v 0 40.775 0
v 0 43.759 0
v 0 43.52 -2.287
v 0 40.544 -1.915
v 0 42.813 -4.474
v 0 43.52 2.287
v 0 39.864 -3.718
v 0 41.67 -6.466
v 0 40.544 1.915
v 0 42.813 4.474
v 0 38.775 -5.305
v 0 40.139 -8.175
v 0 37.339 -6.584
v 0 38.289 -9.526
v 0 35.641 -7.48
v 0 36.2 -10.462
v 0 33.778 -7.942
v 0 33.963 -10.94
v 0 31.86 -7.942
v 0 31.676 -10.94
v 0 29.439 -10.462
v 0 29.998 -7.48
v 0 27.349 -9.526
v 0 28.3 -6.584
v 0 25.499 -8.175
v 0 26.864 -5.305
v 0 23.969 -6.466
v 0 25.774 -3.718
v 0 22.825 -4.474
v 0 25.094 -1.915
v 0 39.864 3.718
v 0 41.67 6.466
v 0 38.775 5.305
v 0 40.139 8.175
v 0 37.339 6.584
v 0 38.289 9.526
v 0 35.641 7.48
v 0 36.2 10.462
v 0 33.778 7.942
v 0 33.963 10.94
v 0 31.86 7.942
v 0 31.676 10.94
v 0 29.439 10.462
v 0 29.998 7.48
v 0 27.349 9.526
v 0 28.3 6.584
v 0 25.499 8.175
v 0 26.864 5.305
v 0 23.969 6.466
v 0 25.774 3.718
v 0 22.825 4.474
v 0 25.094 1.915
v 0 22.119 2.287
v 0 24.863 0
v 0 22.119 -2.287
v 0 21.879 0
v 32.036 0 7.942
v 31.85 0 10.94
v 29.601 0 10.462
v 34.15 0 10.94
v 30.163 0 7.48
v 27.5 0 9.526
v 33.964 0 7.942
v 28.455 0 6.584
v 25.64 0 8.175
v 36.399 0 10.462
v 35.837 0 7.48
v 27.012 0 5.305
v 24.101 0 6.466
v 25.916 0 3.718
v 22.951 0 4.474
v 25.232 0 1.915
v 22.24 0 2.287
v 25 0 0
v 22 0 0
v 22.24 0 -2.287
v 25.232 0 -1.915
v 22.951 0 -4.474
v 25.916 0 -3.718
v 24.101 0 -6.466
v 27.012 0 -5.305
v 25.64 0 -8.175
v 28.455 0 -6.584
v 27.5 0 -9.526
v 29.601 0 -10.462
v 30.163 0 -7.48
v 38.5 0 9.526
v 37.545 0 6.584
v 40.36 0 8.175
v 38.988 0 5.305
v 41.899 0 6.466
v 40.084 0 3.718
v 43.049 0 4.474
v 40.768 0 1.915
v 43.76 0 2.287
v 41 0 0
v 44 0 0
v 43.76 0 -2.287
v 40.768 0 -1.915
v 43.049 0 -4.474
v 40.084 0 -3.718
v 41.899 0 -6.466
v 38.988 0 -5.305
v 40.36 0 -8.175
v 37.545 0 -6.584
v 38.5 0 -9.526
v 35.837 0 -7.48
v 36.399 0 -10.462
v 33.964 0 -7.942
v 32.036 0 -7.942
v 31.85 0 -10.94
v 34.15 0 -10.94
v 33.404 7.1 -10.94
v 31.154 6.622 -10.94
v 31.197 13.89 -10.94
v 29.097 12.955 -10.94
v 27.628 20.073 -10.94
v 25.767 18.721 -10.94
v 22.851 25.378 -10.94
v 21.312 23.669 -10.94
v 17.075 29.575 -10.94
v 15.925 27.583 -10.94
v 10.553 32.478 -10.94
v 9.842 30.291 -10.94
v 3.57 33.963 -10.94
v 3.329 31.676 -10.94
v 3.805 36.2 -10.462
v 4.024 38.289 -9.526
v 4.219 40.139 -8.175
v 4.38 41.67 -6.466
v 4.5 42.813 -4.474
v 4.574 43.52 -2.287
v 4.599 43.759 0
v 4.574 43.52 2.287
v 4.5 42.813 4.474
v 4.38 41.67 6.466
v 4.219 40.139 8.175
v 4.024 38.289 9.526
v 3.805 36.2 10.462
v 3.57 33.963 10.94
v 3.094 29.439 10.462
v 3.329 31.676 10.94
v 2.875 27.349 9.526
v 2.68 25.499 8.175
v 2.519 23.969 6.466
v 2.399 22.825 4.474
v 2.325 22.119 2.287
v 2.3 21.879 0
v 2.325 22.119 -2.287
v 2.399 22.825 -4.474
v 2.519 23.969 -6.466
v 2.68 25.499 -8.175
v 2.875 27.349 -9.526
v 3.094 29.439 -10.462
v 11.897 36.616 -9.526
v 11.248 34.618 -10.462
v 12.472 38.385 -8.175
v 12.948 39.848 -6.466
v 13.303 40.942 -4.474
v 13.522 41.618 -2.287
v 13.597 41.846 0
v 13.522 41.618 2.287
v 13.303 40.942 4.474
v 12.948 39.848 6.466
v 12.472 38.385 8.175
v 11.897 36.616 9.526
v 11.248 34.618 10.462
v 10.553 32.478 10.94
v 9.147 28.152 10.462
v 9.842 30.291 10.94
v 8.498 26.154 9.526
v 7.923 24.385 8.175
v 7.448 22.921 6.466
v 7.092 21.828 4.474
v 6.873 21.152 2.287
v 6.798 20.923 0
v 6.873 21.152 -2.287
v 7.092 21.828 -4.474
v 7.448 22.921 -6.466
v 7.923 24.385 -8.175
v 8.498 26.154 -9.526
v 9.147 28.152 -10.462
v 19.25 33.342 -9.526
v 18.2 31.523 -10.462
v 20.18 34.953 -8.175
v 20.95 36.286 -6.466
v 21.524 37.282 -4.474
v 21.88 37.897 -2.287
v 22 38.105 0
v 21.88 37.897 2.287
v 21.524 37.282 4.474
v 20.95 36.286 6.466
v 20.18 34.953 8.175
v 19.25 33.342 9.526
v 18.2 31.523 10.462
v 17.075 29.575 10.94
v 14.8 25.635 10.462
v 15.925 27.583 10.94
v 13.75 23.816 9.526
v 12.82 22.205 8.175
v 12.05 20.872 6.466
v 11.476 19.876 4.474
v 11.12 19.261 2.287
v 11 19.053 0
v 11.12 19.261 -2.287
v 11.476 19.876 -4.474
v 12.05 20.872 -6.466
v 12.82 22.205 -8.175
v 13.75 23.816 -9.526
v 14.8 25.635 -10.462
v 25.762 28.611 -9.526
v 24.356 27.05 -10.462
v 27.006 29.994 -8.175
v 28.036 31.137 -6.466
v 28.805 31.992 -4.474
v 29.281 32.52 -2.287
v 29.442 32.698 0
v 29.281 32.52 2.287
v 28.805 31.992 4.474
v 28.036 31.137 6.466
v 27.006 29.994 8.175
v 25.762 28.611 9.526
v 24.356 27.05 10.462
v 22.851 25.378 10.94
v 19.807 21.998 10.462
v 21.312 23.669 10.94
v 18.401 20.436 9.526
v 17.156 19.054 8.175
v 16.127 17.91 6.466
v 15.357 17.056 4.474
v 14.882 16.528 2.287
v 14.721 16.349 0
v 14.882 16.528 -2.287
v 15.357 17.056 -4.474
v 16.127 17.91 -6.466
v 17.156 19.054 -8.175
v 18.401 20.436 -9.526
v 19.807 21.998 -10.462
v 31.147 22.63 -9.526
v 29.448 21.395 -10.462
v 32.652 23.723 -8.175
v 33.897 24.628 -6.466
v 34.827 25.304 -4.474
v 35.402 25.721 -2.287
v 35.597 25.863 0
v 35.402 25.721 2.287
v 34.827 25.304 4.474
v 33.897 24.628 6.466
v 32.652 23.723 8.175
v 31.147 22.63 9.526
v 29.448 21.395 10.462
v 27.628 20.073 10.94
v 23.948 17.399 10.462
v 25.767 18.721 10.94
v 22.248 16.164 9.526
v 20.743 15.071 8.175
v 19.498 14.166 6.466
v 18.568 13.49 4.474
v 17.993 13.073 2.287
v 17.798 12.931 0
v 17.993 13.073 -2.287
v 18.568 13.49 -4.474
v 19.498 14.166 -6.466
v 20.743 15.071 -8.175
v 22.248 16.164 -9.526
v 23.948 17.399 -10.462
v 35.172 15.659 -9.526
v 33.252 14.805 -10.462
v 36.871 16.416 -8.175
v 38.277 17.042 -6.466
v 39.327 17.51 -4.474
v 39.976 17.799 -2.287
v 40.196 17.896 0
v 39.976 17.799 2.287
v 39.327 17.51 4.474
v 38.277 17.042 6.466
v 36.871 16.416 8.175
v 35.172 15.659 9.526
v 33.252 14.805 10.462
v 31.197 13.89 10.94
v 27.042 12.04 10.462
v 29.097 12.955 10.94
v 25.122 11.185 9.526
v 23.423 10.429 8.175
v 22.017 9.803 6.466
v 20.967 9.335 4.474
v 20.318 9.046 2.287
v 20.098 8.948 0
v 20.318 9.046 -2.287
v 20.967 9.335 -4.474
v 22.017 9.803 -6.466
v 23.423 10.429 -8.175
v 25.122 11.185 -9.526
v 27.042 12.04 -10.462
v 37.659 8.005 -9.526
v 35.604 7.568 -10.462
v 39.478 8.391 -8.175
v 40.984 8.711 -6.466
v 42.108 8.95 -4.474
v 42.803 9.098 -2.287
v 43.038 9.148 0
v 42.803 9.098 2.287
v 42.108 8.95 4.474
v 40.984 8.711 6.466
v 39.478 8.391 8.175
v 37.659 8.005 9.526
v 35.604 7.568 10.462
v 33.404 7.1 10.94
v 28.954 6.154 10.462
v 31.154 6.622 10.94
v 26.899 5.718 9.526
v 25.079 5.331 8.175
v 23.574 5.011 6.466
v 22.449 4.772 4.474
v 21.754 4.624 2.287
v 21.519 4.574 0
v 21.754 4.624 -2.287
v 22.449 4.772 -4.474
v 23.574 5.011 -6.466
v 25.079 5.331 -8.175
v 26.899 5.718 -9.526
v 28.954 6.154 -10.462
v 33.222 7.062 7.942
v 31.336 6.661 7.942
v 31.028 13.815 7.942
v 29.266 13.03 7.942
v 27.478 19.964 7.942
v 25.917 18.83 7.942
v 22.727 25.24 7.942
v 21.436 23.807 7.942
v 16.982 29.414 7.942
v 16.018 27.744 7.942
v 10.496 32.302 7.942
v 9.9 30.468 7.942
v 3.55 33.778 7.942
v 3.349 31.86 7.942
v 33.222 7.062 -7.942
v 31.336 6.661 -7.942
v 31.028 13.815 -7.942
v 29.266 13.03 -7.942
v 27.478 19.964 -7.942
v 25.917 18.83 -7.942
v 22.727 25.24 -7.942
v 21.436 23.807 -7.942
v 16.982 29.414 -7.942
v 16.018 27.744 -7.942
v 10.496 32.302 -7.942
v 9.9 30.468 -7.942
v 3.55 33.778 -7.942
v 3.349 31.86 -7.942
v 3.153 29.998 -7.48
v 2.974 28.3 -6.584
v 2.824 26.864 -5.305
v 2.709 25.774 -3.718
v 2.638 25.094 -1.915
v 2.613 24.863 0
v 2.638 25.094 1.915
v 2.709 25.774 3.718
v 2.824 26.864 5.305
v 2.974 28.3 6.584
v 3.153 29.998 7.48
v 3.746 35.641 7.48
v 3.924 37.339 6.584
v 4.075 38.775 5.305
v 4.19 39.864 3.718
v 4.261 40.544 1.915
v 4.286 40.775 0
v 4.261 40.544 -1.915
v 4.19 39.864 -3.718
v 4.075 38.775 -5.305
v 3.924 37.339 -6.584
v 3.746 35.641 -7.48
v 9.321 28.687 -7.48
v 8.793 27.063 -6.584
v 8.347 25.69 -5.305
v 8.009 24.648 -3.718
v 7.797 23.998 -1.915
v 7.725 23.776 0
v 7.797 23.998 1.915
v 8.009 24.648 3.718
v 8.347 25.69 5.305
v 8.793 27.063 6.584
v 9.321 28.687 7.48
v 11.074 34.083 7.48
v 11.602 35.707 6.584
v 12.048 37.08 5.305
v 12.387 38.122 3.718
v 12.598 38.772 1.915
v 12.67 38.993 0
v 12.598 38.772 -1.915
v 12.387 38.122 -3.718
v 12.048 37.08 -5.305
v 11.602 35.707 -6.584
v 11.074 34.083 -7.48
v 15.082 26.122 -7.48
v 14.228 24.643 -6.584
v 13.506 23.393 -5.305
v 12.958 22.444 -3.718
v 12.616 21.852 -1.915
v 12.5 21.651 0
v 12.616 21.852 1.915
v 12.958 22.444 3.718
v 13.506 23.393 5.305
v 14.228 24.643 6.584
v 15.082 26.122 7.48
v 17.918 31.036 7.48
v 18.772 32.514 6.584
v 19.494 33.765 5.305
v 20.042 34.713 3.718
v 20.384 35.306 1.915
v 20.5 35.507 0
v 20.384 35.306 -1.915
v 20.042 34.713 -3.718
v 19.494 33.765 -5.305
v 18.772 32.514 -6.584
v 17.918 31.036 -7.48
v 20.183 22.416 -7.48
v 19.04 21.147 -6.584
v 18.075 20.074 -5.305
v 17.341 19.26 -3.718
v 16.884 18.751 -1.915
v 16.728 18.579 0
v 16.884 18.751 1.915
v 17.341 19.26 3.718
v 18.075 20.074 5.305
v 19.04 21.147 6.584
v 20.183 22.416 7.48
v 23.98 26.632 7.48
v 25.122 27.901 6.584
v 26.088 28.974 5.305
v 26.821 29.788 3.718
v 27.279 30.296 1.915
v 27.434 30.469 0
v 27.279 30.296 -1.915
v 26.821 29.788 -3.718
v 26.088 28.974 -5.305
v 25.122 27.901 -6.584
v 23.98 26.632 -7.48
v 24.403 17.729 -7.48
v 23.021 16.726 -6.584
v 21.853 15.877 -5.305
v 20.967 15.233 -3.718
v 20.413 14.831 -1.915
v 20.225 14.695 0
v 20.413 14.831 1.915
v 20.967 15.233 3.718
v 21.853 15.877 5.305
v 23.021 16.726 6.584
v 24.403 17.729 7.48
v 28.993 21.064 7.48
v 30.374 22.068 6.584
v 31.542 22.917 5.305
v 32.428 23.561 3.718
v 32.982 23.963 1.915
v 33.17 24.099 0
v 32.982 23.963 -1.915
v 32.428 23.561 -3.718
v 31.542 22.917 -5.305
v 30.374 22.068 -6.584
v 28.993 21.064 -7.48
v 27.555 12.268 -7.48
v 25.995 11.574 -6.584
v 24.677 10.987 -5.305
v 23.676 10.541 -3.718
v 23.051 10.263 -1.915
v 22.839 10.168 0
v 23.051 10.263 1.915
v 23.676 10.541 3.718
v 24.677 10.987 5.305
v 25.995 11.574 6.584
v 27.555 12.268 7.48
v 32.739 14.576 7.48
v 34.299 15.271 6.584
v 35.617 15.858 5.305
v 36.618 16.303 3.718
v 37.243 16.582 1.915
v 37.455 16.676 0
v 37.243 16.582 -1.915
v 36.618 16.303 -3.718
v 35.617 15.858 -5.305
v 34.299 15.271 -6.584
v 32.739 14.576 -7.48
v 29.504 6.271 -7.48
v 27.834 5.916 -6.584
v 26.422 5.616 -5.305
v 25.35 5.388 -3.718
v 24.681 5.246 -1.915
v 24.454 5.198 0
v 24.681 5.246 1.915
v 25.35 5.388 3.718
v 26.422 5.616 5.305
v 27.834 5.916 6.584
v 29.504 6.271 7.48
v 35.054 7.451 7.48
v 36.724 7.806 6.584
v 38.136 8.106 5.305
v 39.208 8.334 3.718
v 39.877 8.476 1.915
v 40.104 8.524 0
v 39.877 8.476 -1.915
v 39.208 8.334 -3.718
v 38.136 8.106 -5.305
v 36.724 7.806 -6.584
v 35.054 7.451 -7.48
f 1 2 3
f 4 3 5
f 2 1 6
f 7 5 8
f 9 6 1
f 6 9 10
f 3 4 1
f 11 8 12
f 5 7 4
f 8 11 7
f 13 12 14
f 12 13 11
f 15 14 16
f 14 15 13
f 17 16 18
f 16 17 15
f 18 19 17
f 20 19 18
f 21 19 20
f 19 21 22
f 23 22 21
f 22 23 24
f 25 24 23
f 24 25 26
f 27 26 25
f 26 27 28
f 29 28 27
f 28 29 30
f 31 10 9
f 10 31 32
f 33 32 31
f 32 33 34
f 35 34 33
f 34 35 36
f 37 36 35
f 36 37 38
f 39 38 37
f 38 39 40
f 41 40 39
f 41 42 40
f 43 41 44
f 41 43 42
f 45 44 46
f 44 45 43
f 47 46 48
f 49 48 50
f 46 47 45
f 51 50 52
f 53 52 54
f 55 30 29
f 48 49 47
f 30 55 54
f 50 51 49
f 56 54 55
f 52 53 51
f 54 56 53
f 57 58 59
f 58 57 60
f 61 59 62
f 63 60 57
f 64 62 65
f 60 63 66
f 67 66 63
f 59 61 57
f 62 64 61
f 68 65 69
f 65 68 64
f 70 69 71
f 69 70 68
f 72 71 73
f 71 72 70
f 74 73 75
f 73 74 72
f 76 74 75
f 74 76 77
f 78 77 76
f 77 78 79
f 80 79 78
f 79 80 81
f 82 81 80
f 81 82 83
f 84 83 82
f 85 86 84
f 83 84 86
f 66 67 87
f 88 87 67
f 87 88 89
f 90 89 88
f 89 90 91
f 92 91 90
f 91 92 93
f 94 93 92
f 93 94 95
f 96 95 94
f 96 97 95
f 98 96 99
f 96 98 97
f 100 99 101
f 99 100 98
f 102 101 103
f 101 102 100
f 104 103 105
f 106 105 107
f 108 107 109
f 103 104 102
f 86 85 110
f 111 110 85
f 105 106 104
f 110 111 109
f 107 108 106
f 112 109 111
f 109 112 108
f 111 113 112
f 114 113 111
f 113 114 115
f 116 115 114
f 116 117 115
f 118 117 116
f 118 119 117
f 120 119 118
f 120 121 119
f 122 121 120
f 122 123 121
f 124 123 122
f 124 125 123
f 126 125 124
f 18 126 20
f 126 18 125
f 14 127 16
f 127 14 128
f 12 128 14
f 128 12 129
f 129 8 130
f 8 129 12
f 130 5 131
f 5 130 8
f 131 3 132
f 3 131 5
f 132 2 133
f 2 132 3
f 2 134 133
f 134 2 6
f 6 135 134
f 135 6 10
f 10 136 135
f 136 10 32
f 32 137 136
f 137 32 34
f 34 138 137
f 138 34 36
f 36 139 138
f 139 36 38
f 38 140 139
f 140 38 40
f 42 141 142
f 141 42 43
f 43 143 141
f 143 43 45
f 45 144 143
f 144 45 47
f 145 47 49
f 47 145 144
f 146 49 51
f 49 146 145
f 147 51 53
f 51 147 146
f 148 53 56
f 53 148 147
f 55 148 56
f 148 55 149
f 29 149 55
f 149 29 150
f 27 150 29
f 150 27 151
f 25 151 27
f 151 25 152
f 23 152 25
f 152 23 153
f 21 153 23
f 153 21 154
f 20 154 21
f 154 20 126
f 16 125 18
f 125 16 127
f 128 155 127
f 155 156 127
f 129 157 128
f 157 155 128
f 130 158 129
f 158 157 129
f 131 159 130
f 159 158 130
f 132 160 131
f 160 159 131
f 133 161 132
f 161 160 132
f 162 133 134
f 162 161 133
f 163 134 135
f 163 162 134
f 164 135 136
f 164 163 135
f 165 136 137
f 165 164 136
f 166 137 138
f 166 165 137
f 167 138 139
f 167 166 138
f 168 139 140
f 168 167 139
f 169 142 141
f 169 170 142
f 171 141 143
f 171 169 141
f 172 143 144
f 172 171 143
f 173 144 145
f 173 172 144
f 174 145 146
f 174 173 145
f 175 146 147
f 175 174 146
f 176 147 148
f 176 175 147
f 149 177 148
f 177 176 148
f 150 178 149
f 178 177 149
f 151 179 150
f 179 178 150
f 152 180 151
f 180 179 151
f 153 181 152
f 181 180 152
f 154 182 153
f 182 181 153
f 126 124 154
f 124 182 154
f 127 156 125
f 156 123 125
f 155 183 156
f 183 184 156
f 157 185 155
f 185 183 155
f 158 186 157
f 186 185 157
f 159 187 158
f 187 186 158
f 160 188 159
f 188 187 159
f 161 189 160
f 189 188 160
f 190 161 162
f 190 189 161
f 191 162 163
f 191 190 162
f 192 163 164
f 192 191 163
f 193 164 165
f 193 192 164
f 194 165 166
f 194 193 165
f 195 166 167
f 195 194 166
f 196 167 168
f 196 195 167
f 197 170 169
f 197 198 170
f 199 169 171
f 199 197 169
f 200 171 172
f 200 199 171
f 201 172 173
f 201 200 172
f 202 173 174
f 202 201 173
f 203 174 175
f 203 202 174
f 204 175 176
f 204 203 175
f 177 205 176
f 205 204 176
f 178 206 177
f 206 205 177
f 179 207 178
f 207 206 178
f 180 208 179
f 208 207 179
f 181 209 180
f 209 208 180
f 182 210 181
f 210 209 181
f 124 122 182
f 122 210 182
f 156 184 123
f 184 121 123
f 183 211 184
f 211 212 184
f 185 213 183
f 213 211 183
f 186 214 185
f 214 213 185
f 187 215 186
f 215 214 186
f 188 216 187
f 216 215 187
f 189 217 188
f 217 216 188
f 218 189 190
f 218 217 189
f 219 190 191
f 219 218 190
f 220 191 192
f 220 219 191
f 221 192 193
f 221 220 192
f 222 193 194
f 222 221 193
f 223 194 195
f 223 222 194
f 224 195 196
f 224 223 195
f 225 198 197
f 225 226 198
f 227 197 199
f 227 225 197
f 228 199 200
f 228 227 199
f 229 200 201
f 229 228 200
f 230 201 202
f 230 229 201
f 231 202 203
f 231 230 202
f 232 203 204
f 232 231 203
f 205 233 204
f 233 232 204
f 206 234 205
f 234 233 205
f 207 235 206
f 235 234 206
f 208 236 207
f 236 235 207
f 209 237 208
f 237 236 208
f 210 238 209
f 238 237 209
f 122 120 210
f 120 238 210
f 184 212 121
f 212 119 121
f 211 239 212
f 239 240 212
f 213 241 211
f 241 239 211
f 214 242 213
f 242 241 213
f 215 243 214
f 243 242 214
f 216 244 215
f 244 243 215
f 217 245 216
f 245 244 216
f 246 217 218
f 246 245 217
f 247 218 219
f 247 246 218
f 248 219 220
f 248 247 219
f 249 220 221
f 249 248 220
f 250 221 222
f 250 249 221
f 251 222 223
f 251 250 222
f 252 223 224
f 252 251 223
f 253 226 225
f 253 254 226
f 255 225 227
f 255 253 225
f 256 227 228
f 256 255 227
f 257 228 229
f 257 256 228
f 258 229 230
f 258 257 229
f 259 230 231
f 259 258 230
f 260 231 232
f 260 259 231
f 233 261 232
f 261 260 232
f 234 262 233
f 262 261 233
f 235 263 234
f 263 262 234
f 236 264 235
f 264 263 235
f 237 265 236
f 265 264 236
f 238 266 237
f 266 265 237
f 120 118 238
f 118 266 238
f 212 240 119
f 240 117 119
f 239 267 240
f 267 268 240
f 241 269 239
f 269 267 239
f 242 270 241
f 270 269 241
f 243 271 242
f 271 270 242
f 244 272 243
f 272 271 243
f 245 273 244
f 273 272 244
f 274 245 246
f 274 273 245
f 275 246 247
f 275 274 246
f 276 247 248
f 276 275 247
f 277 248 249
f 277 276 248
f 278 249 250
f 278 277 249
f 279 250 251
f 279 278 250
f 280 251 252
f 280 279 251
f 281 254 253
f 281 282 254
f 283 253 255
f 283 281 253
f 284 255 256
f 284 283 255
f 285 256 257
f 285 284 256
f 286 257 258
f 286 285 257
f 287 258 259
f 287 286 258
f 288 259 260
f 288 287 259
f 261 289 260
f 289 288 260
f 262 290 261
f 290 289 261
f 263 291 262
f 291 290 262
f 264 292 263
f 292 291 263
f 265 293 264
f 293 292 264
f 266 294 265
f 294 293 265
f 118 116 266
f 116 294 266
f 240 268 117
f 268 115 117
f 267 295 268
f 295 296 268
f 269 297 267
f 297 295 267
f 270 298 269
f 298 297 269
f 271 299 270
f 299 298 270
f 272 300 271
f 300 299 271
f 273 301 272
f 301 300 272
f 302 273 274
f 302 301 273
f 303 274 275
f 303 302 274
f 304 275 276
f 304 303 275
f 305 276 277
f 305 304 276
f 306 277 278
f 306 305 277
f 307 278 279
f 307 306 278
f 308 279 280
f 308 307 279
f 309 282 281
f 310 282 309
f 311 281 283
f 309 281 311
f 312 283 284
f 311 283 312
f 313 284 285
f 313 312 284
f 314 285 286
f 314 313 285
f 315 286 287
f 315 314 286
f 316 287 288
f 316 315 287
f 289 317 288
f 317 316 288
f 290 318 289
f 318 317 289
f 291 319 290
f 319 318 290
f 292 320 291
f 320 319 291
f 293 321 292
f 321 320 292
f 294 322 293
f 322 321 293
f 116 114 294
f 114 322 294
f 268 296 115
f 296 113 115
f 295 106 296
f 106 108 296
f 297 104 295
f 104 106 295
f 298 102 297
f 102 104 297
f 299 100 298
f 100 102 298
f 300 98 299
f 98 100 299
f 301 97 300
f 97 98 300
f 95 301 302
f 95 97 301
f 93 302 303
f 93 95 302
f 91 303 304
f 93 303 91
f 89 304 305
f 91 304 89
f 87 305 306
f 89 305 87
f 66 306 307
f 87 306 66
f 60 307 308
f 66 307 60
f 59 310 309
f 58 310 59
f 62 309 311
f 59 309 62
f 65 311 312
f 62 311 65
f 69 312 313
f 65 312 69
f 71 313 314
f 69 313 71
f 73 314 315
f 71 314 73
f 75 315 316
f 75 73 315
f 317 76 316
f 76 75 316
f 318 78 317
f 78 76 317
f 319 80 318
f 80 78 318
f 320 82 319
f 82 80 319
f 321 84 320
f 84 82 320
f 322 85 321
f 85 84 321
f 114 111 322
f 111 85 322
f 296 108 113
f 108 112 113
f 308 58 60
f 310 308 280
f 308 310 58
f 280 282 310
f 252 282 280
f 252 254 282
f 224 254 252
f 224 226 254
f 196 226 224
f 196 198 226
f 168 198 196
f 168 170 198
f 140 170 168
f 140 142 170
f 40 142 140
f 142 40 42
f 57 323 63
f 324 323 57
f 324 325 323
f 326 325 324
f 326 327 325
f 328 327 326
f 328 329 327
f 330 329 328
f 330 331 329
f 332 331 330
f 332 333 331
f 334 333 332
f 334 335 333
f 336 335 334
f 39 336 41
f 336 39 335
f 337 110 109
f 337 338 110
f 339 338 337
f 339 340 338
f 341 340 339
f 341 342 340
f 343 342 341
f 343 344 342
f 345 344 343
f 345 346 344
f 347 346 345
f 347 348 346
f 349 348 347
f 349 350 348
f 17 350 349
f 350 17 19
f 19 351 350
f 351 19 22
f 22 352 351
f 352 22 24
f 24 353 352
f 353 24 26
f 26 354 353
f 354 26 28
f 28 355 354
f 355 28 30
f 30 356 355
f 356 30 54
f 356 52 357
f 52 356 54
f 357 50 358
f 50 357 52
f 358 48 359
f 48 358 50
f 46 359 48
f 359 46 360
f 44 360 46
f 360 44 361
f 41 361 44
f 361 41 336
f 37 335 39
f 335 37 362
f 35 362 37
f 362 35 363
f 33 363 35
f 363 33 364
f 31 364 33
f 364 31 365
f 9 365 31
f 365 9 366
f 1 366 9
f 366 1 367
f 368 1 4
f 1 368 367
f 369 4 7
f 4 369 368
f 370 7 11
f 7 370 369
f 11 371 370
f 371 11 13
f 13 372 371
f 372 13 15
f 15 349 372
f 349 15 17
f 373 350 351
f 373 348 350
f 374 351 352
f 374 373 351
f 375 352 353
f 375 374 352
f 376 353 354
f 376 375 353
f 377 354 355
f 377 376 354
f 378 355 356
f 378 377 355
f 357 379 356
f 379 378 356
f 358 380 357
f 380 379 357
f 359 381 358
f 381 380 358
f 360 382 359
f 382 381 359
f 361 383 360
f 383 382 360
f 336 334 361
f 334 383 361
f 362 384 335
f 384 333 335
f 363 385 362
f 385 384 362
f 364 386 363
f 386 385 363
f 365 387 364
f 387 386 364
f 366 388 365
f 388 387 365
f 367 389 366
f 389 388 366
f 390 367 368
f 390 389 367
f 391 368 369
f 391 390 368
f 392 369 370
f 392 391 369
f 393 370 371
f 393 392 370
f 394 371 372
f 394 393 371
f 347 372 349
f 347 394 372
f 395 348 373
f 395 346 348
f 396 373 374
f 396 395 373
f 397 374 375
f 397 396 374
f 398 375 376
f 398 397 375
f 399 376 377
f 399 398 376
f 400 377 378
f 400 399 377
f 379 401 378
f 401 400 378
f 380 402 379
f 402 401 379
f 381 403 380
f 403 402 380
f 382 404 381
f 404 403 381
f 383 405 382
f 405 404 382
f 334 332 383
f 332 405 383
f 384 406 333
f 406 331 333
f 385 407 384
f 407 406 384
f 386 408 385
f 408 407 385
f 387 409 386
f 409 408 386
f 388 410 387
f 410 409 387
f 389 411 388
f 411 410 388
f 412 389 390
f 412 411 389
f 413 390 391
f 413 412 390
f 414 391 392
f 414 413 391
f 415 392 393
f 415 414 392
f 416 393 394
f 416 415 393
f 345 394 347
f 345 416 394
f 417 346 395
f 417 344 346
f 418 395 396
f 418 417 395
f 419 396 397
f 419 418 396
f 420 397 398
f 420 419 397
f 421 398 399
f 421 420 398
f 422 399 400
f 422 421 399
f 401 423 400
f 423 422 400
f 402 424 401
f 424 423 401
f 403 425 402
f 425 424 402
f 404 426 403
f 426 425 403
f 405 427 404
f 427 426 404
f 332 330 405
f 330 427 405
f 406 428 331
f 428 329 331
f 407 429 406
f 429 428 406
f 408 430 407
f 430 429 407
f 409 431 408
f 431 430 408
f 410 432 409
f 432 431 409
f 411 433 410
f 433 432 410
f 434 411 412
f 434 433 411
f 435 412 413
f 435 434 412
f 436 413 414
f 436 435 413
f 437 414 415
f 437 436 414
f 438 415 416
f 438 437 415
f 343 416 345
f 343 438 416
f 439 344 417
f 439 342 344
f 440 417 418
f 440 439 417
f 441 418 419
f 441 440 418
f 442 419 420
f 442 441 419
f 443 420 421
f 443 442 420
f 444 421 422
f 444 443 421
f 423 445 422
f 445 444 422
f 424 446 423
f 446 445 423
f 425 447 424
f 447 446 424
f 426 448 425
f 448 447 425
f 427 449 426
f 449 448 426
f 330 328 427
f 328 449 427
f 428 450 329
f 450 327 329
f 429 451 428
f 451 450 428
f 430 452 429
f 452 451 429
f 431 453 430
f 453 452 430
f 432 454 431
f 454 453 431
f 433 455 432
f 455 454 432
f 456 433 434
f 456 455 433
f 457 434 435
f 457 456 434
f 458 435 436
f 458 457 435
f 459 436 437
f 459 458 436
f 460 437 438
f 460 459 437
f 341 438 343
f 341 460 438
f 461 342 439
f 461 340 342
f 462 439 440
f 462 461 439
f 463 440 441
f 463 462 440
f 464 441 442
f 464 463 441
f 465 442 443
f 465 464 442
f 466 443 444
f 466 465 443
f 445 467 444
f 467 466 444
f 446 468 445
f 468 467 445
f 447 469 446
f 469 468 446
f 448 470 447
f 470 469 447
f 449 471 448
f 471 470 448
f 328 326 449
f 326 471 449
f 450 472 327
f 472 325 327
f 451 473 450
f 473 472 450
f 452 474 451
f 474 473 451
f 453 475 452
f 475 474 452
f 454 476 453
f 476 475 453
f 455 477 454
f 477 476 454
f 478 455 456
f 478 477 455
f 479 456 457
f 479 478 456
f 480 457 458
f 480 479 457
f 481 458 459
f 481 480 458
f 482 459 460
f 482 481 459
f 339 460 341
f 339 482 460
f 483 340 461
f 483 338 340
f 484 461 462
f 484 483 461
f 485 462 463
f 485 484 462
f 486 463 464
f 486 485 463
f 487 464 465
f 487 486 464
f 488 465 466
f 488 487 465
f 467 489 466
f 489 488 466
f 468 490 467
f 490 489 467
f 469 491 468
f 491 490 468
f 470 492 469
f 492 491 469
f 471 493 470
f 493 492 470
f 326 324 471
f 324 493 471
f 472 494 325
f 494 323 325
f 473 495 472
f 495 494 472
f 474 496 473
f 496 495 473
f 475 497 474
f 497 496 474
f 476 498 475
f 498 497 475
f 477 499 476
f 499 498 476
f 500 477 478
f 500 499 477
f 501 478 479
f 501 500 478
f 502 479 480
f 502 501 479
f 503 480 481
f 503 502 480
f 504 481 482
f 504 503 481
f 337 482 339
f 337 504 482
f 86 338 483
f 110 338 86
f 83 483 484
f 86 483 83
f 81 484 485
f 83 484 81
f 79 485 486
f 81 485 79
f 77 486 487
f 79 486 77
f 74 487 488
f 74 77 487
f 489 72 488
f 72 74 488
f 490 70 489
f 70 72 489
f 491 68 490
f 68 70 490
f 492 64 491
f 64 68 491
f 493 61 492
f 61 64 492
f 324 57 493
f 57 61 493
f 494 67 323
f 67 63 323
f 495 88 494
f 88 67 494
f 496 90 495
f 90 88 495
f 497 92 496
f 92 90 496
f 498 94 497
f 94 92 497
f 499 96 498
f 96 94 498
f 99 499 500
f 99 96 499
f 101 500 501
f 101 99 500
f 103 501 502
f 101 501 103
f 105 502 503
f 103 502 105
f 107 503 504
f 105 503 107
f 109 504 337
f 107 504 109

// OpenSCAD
module elbow(innerRadius, outerRadius, bendRadius) {
  intersection() {
    translate([0,0,-bendRadius]) cube(size=2*bendRadius, center=false);
	rotate_extrude() {
	  translate([bendRadius, 0, 0]) 
	  difference() {
        circle(outerRadius);
        circle(innerRadius);
      }
    }
  }
}

elbow(innerRadius=8, outerRadius=11, bendRadius=33);
